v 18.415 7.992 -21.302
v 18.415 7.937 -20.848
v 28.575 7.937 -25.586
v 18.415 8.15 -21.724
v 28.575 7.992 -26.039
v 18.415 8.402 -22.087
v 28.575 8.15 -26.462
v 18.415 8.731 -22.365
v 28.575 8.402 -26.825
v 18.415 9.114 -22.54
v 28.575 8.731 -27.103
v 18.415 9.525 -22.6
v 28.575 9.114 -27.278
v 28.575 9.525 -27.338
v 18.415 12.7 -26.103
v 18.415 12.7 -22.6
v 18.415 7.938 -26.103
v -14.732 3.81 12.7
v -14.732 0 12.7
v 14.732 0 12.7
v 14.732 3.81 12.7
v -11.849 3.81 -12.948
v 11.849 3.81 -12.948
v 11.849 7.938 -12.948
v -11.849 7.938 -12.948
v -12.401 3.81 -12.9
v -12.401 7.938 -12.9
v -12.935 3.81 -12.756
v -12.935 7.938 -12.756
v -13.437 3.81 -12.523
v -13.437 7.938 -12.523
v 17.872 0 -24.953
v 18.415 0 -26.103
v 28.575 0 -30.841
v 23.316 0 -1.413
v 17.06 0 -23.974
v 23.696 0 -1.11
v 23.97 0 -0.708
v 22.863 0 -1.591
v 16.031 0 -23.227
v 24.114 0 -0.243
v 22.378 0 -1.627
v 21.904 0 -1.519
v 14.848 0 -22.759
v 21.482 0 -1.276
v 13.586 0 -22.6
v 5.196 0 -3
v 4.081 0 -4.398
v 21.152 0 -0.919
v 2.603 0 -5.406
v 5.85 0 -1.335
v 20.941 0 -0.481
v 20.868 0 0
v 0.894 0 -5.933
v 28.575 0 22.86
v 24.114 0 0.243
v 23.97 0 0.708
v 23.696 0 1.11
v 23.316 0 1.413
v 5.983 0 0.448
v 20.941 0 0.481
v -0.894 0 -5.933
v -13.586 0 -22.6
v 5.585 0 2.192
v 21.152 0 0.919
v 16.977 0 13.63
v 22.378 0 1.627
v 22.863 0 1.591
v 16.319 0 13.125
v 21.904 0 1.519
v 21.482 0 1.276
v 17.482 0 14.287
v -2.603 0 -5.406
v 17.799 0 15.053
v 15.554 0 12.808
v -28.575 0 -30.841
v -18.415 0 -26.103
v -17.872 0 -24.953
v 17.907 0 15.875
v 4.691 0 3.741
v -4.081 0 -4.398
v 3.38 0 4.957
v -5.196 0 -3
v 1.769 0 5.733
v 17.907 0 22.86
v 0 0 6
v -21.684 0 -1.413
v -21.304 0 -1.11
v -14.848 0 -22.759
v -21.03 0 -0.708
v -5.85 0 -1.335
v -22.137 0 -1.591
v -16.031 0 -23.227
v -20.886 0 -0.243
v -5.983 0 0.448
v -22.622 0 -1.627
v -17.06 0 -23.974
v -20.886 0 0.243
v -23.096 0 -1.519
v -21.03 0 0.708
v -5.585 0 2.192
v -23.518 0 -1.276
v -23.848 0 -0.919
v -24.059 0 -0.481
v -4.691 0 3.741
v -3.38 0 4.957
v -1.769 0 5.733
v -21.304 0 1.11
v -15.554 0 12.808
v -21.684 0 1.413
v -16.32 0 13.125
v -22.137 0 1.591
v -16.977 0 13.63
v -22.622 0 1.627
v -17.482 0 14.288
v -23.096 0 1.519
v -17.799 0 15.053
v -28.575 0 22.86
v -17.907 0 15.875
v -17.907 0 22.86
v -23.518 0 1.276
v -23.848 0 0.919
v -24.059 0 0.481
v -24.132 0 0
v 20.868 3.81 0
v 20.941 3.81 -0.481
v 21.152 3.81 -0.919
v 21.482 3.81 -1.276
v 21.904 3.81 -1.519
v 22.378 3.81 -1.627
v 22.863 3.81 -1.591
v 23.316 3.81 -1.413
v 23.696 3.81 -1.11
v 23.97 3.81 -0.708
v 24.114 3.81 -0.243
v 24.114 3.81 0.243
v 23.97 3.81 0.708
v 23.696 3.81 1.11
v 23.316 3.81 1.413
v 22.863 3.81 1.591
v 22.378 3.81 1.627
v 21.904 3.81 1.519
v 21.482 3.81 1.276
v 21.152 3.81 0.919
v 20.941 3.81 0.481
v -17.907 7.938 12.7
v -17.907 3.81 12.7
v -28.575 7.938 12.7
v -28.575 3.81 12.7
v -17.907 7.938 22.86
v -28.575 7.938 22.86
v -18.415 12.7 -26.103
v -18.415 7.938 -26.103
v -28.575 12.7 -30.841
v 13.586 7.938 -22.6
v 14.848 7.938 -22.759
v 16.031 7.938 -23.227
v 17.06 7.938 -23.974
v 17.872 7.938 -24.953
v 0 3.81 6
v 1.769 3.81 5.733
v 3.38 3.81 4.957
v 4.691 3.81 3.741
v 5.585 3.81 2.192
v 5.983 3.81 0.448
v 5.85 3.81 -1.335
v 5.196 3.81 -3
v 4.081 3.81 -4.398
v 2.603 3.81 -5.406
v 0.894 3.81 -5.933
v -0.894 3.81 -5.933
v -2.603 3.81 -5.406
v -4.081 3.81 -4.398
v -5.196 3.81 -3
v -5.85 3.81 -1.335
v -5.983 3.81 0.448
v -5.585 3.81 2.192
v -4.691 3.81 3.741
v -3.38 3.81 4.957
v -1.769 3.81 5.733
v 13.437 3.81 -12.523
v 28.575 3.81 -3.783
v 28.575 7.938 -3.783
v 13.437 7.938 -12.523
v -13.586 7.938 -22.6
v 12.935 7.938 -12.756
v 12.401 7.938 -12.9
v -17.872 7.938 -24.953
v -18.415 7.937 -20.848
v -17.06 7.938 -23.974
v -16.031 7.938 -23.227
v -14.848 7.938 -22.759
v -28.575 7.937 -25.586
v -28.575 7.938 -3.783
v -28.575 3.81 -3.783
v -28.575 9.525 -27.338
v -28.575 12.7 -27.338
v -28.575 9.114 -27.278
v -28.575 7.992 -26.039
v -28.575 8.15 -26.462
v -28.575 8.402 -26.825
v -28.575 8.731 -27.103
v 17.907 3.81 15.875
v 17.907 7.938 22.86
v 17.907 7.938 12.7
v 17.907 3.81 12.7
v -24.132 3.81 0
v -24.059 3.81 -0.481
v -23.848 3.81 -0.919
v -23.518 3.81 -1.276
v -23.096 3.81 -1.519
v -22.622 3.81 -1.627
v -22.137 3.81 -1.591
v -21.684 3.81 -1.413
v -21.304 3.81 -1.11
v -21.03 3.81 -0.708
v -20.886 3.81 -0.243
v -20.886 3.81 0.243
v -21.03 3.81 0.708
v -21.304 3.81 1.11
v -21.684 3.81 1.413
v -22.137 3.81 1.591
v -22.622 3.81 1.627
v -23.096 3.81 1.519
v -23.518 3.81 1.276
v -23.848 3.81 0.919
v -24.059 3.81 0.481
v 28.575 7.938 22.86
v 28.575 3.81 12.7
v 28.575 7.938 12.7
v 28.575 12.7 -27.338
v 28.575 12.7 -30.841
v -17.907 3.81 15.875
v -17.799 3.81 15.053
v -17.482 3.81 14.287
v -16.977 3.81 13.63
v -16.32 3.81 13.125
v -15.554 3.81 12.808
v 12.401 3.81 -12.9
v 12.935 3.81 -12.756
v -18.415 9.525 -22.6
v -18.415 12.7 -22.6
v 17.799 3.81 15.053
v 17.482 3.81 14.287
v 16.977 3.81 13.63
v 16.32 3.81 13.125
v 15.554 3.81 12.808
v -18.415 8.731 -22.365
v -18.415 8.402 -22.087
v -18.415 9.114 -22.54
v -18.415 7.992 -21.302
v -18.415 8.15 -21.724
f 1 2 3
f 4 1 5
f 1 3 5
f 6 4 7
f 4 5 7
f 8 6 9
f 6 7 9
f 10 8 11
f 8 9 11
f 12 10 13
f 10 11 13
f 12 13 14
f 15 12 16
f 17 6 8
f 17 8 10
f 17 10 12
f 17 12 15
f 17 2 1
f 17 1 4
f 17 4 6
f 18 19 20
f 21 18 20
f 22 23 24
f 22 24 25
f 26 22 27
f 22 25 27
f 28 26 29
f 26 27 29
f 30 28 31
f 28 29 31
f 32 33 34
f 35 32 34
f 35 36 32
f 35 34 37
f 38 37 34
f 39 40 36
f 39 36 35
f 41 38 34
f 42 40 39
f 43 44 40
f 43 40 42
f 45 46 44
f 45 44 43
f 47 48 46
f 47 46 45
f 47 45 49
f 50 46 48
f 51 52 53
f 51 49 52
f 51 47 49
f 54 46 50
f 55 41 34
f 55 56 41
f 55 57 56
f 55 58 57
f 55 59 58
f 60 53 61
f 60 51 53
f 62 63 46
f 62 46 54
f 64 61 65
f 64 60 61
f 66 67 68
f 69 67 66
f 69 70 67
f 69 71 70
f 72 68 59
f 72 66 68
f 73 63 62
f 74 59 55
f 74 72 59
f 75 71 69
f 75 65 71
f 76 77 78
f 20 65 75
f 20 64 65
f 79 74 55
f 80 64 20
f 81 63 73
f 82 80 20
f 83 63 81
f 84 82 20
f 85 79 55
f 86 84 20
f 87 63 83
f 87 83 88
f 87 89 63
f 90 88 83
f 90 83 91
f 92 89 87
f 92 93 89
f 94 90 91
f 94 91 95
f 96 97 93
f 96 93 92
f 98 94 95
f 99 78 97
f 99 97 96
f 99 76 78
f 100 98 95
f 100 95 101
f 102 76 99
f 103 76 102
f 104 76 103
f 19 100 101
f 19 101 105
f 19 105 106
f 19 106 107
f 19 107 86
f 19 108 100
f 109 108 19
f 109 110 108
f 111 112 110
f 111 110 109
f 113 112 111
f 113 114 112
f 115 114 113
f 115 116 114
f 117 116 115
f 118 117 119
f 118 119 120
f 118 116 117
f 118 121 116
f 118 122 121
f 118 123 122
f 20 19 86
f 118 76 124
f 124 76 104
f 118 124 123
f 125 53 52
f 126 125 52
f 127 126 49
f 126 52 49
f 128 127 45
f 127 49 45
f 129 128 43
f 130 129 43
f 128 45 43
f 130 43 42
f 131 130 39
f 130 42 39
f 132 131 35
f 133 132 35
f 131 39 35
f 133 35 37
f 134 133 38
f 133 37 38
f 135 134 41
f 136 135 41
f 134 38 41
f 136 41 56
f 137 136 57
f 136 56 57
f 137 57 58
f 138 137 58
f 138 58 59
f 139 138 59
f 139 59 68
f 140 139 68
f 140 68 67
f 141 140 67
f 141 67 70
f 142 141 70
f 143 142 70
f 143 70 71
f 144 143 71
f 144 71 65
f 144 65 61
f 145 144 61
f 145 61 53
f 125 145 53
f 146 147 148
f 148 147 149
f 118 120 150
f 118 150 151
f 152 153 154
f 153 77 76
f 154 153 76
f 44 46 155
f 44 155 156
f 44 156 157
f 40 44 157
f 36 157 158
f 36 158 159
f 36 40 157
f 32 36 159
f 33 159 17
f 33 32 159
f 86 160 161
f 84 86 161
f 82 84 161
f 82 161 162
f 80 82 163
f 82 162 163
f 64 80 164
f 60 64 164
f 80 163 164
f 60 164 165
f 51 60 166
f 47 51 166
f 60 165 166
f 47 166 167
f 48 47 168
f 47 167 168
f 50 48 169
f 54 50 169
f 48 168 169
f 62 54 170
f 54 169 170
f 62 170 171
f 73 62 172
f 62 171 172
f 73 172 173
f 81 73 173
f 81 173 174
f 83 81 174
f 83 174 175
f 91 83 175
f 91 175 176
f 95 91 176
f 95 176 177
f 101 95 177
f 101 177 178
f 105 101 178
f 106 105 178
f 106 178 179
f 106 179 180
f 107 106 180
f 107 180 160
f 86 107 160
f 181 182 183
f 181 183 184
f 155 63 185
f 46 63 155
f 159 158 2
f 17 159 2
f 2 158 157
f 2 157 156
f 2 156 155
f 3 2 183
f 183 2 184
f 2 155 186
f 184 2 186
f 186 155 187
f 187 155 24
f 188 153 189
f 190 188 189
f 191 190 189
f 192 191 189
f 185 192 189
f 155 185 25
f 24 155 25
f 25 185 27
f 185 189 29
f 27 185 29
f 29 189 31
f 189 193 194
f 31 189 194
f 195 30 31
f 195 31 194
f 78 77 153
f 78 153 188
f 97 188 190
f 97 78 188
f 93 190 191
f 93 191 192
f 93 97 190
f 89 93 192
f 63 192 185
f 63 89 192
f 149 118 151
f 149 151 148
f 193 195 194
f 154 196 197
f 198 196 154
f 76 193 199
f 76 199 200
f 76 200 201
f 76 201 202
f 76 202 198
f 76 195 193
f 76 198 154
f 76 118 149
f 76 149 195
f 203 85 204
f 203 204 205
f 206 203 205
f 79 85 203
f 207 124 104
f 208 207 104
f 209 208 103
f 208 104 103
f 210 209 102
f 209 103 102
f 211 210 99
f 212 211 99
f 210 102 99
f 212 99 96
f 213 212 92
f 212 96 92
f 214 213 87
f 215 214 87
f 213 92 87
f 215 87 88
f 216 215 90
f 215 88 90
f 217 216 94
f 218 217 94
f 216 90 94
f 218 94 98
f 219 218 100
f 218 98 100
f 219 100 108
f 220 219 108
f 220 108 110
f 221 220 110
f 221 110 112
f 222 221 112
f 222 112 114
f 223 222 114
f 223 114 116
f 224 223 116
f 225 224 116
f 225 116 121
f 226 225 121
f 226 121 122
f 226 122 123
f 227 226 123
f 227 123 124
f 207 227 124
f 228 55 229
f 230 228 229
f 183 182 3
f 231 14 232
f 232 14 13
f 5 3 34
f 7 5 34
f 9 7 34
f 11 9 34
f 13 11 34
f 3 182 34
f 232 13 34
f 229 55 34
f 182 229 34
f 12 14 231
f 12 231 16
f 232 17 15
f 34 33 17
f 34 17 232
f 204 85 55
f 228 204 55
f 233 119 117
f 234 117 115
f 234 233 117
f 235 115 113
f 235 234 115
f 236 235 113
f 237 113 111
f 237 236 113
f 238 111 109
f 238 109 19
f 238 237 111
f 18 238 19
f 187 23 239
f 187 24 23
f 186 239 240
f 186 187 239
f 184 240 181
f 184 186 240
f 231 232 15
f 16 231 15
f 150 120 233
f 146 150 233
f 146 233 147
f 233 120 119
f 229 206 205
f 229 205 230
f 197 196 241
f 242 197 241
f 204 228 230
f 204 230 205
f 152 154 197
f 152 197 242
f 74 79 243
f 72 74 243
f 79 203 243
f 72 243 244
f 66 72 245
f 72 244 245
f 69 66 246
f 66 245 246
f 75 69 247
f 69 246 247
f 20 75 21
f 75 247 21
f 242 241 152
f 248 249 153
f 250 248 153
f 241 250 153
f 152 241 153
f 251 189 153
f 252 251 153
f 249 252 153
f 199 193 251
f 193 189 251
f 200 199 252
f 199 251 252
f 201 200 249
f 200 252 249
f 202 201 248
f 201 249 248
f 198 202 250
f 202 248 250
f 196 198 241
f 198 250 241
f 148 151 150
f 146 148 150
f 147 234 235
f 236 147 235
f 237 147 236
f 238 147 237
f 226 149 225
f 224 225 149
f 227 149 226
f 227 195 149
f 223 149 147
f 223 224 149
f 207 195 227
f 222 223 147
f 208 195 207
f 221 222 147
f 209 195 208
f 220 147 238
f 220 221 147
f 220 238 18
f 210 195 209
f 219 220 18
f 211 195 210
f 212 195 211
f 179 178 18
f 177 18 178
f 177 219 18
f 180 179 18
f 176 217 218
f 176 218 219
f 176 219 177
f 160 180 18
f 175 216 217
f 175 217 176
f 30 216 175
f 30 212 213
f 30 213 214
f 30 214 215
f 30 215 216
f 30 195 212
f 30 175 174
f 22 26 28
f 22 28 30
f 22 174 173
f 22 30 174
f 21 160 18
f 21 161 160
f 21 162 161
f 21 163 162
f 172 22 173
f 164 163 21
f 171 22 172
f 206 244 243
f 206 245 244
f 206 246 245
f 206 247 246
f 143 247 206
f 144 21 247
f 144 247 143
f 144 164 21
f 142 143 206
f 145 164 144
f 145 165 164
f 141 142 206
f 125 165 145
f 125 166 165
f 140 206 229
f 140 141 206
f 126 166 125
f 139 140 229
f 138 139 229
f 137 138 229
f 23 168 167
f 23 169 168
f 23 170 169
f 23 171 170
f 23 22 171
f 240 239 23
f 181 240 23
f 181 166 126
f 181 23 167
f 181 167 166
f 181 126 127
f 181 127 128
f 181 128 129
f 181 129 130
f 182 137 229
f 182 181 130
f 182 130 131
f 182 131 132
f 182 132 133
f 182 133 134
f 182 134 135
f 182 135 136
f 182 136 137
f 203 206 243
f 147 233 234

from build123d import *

# Parameters (mm, degrees)
SKETCH1_W             = 57.15
SKETCH1_H             = 25.4
BOSS_EXTRUDE1_DEPTH   = 3.81
CUT_EXTRUDE1_REACH    = 33.501
SKETCH2_R             = 6
F_4_CLEARANCE_HOLE1_D = 3.2639
BOSS_EXTRUDE4_DEPTH   = 3.81
BOSS_EXTRUDE5_DEPTH   = 8.89
SKETCH12_W            = 36.83
SKETCH12_H            = 9.899955096
BOSS_EXTRUDE6_DEPTH   = 3.81
BOSS_EXTRUDE7_DEPTH   = 4.1275
FILLET4_R             = 3.175
FILLET5_R             = 1.5875
BOSS_EXTRUDE8_REACH   = 45.92
SKETCH14_W            = 10.668
SKETCH14_H            = 10.16
FILLET6_R             = 3.175
FILLET7_R             = 5.08


with BuildPart() as part:
    # Sketch1 → Boss-Extrude1 (new body)
    with BuildSketch(Plane(origin=(0, 0, 0), x_dir=(1, 0, 0), z_dir=(0, 1, 0))):
        Rectangle(SKETCH1_W, SKETCH1_H)
    extrude(amount=BOSS_EXTRUDE1_DEPTH)

    # Sketch2 → Cut-Extrude1 (cut, up to next)
    with BuildSketch(Plane(origin=(0, 3.81, 0), x_dir=(1, 0, 0), z_dir=(0, 1, 0)), mode=Mode.PRIVATE) as cut_extrude1_sk1:
        with Locations(Location((0, 0, 0), (0, 0, 270))):
            Circle(SKETCH2_R)
    cut_extrude1_tool1 = extrude(cut_extrude1_sk1.sketch, amount=-CUT_EXTRUDE1_REACH, mode=Mode.PRIVATE) & part.part
    add(cut_extrude1_tool1.solids().sort_by_distance((0, 3.81, 0))[0], mode=Mode.SUBTRACT)

    # #4 Clearance Hole1 (through all)
    with Locations(Plane(origin=(0, 3.81, 0), x_dir=(1, 0, 0), z_dir=(0, 1, 0))):
        with Locations((-22.5, 0), (22.5, 0)):
            Hole(F_4_CLEARANCE_HOLE1_D / 2)

    # Sketch8 → Boss-Extrude4 (add)
    with BuildSketch(Plane(origin=(0, 3.81, 0), x_dir=(1, 0, 0), z_dir=(0, 1, 0))):
        Polygon((-28.575, 30.840865795), (-28.575, 12.7), (-18.415, 12.7), (-18.415, 26.103179988), align=None)
    boss_extrude4 = extrude(amount=-BOSS_EXTRUDE4_DEPTH)

    # Mirror4: Boss-Extrude4 across plane
    add(boss_extrude4.mirror(Plane(origin=(0, 0, 0), x_dir=(0, 0, 1), z_dir=(1, 0, 0))))

    # Sketch11 → Boss-Extrude5 (add)
    with BuildSketch(Plane(origin=(0, 3.81, 0), x_dir=(1, 0, 0), z_dir=(0, 1, 0))):
        Polygon((-18.415, 26.103179988), (-28.575, 30.840865795), (-28.575, 27.337640903), (-18.415, 22.599955096), align=None)
    boss_extrude5 = extrude(amount=BOSS_EXTRUDE5_DEPTH)

    # Mirror7: Boss-Extrude5 across plane
    add(boss_extrude5.mirror(Plane(origin=(0, 0, 0), x_dir=(0, 0, 1), z_dir=(1, 0, 0))))

    # Sketch12 → Boss-Extrude6 (add)
    with BuildSketch(Plane(origin=(0, 3.81, 0), x_dir=(1, 0, 0), z_dir=(0, 1, 0))):
        with Locations((0, 17.649977548)):
            Rectangle(SKETCH12_W, SKETCH12_H)
    extrude(amount=-BOSS_EXTRUDE6_DEPTH)

    # Sketch13 → Boss-Extrude7 (add)
    with BuildSketch(Plane(origin=(0, 3.81, 0), x_dir=(1, 0, 0), z_dir=(0, 1, 0))):
        Polygon((12.7, 12.947955096), (-12.7, 12.947955096), (-28.575, 3.782519572), (-28.575, 27.337640903), (-18.415, 22.599955096), (18.415, 22.599955096), (28.575, 27.337640903), (28.575, 3.782519572), align=None)
    extrude(amount=BOSS_EXTRUDE7_DEPTH)

    # Fillet4
    fillet4_edges = [part.edges().sort_by_distance(p)[0] for p in [
        (-12.7, 5.87375, -12.947955096),
        (12.7, 5.87375, -12.947955096),
    ]]
    fillet(fillet4_edges, radius=FILLET4_R)

    # Fillet5
    fillet5_edges = [part.edges().sort_by_distance(p)[0] for p in [
        (23.495, 7.9375, -24.968797999),
        (-23.495, 7.9375, -24.968797999),
    ]]
    fillet(fillet5_edges, radius=FILLET5_R)

    # Boss-Extrude8: up to this face of the body (flat: up to its plane)
    boss_extrude8_end = Plane(part.part.faces().sort_by_distance((0, 7.9375, -16.275006061))[0])
    # Sketch14 → Boss-Extrude8 (add, up to the picked face)
    with BuildSketch(Plane(origin=(0, 0, 0), x_dir=(1, 0, 0), z_dir=(0, 1, 0)), mode=Mode.PRIVATE) as boss_extrude8_sk1:
        with Locations((23.241, -17.78)):
            Rectangle(SKETCH14_W, SKETCH14_H)
    boss_extrude8_tool1 = split(extrude(boss_extrude8_sk1.sketch, amount=BOSS_EXTRUDE8_REACH, mode=Mode.PRIVATE), bisect_by=boss_extrude8_end, keep=Keep.BOTH, mode=Mode.PRIVATE)
    boss_extrude8 = boss_extrude8_tool1.solids().sort_by(Axis((23.241, 0, 17.78), (0, 1, 0)))[0]
    add(boss_extrude8)

    # Mirror9: Boss-Extrude8 across plane
    add(boss_extrude8.mirror(Plane(origin=(0, 0, 0), x_dir=(0, 0, 1), z_dir=(1, 0, 0))))

    # Fillet6
    fillet6_edges = [part.edges().sort_by_distance(p)[0] for p in [
        (17.907, 1.905, 12.7),
        (-17.907, 1.905, 12.7),
    ]]
    fillet(fillet6_edges, radius=FILLET6_R)

    # Fillet7
    # the kernel refuses this fillet: 5.08 mm, written as the material it adds along each edge
    with BuildSketch(Plane(origin=(-18.415, 0, -22.599955096), x_dir=(0, 0, -1), z_dir=(0, 1, 0))) as fillet7_piece_1:
        with BuildLine():
            CenterArc((5.08, -4.829097251), FILLET7_R, 108.082662978, 71.917337022)
            Line((0, -4.829097251), (-0.1016, -4.829097251))
            Line((-0.1016, -4.829097251), (-0.1016, 0))
            Line((-0.1016, 0), (0, 0.1016))
            ThreePointArc((0, 0.1016), (1.751612446, 0.1016), (3.471689391, 0.096581945))
            Line((3.471689391, 0.096581945), (3.503224893, 0))
        make_face()
    extrude(amount=7.9375)
    with BuildSketch(Plane(origin=(18.415, 0, -22.599955096), x_dir=(0, 0, -1), z_dir=(0, 1, 0))) as fillet7_piece_2:
        with BuildLine():
            CenterArc((5.08, 4.829097251), FILLET7_R, 180, 71.917337022)
            Line((0, 4.829097251), (-0.1016, 4.829097251))
            Line((-0.1016, 4.829097251), (-0.1016, 0))
            Line((-0.1016, 0), (0, -0.1016))
            ThreePointArc((0, -0.1016), (1.751612446, -0.1016), (3.471689391, -0.096581945))
            Line((3.471689391, -0.096581945), (3.503224893, 0))
        make_face()
    extrude(amount=7.9375)


solid = part.part
